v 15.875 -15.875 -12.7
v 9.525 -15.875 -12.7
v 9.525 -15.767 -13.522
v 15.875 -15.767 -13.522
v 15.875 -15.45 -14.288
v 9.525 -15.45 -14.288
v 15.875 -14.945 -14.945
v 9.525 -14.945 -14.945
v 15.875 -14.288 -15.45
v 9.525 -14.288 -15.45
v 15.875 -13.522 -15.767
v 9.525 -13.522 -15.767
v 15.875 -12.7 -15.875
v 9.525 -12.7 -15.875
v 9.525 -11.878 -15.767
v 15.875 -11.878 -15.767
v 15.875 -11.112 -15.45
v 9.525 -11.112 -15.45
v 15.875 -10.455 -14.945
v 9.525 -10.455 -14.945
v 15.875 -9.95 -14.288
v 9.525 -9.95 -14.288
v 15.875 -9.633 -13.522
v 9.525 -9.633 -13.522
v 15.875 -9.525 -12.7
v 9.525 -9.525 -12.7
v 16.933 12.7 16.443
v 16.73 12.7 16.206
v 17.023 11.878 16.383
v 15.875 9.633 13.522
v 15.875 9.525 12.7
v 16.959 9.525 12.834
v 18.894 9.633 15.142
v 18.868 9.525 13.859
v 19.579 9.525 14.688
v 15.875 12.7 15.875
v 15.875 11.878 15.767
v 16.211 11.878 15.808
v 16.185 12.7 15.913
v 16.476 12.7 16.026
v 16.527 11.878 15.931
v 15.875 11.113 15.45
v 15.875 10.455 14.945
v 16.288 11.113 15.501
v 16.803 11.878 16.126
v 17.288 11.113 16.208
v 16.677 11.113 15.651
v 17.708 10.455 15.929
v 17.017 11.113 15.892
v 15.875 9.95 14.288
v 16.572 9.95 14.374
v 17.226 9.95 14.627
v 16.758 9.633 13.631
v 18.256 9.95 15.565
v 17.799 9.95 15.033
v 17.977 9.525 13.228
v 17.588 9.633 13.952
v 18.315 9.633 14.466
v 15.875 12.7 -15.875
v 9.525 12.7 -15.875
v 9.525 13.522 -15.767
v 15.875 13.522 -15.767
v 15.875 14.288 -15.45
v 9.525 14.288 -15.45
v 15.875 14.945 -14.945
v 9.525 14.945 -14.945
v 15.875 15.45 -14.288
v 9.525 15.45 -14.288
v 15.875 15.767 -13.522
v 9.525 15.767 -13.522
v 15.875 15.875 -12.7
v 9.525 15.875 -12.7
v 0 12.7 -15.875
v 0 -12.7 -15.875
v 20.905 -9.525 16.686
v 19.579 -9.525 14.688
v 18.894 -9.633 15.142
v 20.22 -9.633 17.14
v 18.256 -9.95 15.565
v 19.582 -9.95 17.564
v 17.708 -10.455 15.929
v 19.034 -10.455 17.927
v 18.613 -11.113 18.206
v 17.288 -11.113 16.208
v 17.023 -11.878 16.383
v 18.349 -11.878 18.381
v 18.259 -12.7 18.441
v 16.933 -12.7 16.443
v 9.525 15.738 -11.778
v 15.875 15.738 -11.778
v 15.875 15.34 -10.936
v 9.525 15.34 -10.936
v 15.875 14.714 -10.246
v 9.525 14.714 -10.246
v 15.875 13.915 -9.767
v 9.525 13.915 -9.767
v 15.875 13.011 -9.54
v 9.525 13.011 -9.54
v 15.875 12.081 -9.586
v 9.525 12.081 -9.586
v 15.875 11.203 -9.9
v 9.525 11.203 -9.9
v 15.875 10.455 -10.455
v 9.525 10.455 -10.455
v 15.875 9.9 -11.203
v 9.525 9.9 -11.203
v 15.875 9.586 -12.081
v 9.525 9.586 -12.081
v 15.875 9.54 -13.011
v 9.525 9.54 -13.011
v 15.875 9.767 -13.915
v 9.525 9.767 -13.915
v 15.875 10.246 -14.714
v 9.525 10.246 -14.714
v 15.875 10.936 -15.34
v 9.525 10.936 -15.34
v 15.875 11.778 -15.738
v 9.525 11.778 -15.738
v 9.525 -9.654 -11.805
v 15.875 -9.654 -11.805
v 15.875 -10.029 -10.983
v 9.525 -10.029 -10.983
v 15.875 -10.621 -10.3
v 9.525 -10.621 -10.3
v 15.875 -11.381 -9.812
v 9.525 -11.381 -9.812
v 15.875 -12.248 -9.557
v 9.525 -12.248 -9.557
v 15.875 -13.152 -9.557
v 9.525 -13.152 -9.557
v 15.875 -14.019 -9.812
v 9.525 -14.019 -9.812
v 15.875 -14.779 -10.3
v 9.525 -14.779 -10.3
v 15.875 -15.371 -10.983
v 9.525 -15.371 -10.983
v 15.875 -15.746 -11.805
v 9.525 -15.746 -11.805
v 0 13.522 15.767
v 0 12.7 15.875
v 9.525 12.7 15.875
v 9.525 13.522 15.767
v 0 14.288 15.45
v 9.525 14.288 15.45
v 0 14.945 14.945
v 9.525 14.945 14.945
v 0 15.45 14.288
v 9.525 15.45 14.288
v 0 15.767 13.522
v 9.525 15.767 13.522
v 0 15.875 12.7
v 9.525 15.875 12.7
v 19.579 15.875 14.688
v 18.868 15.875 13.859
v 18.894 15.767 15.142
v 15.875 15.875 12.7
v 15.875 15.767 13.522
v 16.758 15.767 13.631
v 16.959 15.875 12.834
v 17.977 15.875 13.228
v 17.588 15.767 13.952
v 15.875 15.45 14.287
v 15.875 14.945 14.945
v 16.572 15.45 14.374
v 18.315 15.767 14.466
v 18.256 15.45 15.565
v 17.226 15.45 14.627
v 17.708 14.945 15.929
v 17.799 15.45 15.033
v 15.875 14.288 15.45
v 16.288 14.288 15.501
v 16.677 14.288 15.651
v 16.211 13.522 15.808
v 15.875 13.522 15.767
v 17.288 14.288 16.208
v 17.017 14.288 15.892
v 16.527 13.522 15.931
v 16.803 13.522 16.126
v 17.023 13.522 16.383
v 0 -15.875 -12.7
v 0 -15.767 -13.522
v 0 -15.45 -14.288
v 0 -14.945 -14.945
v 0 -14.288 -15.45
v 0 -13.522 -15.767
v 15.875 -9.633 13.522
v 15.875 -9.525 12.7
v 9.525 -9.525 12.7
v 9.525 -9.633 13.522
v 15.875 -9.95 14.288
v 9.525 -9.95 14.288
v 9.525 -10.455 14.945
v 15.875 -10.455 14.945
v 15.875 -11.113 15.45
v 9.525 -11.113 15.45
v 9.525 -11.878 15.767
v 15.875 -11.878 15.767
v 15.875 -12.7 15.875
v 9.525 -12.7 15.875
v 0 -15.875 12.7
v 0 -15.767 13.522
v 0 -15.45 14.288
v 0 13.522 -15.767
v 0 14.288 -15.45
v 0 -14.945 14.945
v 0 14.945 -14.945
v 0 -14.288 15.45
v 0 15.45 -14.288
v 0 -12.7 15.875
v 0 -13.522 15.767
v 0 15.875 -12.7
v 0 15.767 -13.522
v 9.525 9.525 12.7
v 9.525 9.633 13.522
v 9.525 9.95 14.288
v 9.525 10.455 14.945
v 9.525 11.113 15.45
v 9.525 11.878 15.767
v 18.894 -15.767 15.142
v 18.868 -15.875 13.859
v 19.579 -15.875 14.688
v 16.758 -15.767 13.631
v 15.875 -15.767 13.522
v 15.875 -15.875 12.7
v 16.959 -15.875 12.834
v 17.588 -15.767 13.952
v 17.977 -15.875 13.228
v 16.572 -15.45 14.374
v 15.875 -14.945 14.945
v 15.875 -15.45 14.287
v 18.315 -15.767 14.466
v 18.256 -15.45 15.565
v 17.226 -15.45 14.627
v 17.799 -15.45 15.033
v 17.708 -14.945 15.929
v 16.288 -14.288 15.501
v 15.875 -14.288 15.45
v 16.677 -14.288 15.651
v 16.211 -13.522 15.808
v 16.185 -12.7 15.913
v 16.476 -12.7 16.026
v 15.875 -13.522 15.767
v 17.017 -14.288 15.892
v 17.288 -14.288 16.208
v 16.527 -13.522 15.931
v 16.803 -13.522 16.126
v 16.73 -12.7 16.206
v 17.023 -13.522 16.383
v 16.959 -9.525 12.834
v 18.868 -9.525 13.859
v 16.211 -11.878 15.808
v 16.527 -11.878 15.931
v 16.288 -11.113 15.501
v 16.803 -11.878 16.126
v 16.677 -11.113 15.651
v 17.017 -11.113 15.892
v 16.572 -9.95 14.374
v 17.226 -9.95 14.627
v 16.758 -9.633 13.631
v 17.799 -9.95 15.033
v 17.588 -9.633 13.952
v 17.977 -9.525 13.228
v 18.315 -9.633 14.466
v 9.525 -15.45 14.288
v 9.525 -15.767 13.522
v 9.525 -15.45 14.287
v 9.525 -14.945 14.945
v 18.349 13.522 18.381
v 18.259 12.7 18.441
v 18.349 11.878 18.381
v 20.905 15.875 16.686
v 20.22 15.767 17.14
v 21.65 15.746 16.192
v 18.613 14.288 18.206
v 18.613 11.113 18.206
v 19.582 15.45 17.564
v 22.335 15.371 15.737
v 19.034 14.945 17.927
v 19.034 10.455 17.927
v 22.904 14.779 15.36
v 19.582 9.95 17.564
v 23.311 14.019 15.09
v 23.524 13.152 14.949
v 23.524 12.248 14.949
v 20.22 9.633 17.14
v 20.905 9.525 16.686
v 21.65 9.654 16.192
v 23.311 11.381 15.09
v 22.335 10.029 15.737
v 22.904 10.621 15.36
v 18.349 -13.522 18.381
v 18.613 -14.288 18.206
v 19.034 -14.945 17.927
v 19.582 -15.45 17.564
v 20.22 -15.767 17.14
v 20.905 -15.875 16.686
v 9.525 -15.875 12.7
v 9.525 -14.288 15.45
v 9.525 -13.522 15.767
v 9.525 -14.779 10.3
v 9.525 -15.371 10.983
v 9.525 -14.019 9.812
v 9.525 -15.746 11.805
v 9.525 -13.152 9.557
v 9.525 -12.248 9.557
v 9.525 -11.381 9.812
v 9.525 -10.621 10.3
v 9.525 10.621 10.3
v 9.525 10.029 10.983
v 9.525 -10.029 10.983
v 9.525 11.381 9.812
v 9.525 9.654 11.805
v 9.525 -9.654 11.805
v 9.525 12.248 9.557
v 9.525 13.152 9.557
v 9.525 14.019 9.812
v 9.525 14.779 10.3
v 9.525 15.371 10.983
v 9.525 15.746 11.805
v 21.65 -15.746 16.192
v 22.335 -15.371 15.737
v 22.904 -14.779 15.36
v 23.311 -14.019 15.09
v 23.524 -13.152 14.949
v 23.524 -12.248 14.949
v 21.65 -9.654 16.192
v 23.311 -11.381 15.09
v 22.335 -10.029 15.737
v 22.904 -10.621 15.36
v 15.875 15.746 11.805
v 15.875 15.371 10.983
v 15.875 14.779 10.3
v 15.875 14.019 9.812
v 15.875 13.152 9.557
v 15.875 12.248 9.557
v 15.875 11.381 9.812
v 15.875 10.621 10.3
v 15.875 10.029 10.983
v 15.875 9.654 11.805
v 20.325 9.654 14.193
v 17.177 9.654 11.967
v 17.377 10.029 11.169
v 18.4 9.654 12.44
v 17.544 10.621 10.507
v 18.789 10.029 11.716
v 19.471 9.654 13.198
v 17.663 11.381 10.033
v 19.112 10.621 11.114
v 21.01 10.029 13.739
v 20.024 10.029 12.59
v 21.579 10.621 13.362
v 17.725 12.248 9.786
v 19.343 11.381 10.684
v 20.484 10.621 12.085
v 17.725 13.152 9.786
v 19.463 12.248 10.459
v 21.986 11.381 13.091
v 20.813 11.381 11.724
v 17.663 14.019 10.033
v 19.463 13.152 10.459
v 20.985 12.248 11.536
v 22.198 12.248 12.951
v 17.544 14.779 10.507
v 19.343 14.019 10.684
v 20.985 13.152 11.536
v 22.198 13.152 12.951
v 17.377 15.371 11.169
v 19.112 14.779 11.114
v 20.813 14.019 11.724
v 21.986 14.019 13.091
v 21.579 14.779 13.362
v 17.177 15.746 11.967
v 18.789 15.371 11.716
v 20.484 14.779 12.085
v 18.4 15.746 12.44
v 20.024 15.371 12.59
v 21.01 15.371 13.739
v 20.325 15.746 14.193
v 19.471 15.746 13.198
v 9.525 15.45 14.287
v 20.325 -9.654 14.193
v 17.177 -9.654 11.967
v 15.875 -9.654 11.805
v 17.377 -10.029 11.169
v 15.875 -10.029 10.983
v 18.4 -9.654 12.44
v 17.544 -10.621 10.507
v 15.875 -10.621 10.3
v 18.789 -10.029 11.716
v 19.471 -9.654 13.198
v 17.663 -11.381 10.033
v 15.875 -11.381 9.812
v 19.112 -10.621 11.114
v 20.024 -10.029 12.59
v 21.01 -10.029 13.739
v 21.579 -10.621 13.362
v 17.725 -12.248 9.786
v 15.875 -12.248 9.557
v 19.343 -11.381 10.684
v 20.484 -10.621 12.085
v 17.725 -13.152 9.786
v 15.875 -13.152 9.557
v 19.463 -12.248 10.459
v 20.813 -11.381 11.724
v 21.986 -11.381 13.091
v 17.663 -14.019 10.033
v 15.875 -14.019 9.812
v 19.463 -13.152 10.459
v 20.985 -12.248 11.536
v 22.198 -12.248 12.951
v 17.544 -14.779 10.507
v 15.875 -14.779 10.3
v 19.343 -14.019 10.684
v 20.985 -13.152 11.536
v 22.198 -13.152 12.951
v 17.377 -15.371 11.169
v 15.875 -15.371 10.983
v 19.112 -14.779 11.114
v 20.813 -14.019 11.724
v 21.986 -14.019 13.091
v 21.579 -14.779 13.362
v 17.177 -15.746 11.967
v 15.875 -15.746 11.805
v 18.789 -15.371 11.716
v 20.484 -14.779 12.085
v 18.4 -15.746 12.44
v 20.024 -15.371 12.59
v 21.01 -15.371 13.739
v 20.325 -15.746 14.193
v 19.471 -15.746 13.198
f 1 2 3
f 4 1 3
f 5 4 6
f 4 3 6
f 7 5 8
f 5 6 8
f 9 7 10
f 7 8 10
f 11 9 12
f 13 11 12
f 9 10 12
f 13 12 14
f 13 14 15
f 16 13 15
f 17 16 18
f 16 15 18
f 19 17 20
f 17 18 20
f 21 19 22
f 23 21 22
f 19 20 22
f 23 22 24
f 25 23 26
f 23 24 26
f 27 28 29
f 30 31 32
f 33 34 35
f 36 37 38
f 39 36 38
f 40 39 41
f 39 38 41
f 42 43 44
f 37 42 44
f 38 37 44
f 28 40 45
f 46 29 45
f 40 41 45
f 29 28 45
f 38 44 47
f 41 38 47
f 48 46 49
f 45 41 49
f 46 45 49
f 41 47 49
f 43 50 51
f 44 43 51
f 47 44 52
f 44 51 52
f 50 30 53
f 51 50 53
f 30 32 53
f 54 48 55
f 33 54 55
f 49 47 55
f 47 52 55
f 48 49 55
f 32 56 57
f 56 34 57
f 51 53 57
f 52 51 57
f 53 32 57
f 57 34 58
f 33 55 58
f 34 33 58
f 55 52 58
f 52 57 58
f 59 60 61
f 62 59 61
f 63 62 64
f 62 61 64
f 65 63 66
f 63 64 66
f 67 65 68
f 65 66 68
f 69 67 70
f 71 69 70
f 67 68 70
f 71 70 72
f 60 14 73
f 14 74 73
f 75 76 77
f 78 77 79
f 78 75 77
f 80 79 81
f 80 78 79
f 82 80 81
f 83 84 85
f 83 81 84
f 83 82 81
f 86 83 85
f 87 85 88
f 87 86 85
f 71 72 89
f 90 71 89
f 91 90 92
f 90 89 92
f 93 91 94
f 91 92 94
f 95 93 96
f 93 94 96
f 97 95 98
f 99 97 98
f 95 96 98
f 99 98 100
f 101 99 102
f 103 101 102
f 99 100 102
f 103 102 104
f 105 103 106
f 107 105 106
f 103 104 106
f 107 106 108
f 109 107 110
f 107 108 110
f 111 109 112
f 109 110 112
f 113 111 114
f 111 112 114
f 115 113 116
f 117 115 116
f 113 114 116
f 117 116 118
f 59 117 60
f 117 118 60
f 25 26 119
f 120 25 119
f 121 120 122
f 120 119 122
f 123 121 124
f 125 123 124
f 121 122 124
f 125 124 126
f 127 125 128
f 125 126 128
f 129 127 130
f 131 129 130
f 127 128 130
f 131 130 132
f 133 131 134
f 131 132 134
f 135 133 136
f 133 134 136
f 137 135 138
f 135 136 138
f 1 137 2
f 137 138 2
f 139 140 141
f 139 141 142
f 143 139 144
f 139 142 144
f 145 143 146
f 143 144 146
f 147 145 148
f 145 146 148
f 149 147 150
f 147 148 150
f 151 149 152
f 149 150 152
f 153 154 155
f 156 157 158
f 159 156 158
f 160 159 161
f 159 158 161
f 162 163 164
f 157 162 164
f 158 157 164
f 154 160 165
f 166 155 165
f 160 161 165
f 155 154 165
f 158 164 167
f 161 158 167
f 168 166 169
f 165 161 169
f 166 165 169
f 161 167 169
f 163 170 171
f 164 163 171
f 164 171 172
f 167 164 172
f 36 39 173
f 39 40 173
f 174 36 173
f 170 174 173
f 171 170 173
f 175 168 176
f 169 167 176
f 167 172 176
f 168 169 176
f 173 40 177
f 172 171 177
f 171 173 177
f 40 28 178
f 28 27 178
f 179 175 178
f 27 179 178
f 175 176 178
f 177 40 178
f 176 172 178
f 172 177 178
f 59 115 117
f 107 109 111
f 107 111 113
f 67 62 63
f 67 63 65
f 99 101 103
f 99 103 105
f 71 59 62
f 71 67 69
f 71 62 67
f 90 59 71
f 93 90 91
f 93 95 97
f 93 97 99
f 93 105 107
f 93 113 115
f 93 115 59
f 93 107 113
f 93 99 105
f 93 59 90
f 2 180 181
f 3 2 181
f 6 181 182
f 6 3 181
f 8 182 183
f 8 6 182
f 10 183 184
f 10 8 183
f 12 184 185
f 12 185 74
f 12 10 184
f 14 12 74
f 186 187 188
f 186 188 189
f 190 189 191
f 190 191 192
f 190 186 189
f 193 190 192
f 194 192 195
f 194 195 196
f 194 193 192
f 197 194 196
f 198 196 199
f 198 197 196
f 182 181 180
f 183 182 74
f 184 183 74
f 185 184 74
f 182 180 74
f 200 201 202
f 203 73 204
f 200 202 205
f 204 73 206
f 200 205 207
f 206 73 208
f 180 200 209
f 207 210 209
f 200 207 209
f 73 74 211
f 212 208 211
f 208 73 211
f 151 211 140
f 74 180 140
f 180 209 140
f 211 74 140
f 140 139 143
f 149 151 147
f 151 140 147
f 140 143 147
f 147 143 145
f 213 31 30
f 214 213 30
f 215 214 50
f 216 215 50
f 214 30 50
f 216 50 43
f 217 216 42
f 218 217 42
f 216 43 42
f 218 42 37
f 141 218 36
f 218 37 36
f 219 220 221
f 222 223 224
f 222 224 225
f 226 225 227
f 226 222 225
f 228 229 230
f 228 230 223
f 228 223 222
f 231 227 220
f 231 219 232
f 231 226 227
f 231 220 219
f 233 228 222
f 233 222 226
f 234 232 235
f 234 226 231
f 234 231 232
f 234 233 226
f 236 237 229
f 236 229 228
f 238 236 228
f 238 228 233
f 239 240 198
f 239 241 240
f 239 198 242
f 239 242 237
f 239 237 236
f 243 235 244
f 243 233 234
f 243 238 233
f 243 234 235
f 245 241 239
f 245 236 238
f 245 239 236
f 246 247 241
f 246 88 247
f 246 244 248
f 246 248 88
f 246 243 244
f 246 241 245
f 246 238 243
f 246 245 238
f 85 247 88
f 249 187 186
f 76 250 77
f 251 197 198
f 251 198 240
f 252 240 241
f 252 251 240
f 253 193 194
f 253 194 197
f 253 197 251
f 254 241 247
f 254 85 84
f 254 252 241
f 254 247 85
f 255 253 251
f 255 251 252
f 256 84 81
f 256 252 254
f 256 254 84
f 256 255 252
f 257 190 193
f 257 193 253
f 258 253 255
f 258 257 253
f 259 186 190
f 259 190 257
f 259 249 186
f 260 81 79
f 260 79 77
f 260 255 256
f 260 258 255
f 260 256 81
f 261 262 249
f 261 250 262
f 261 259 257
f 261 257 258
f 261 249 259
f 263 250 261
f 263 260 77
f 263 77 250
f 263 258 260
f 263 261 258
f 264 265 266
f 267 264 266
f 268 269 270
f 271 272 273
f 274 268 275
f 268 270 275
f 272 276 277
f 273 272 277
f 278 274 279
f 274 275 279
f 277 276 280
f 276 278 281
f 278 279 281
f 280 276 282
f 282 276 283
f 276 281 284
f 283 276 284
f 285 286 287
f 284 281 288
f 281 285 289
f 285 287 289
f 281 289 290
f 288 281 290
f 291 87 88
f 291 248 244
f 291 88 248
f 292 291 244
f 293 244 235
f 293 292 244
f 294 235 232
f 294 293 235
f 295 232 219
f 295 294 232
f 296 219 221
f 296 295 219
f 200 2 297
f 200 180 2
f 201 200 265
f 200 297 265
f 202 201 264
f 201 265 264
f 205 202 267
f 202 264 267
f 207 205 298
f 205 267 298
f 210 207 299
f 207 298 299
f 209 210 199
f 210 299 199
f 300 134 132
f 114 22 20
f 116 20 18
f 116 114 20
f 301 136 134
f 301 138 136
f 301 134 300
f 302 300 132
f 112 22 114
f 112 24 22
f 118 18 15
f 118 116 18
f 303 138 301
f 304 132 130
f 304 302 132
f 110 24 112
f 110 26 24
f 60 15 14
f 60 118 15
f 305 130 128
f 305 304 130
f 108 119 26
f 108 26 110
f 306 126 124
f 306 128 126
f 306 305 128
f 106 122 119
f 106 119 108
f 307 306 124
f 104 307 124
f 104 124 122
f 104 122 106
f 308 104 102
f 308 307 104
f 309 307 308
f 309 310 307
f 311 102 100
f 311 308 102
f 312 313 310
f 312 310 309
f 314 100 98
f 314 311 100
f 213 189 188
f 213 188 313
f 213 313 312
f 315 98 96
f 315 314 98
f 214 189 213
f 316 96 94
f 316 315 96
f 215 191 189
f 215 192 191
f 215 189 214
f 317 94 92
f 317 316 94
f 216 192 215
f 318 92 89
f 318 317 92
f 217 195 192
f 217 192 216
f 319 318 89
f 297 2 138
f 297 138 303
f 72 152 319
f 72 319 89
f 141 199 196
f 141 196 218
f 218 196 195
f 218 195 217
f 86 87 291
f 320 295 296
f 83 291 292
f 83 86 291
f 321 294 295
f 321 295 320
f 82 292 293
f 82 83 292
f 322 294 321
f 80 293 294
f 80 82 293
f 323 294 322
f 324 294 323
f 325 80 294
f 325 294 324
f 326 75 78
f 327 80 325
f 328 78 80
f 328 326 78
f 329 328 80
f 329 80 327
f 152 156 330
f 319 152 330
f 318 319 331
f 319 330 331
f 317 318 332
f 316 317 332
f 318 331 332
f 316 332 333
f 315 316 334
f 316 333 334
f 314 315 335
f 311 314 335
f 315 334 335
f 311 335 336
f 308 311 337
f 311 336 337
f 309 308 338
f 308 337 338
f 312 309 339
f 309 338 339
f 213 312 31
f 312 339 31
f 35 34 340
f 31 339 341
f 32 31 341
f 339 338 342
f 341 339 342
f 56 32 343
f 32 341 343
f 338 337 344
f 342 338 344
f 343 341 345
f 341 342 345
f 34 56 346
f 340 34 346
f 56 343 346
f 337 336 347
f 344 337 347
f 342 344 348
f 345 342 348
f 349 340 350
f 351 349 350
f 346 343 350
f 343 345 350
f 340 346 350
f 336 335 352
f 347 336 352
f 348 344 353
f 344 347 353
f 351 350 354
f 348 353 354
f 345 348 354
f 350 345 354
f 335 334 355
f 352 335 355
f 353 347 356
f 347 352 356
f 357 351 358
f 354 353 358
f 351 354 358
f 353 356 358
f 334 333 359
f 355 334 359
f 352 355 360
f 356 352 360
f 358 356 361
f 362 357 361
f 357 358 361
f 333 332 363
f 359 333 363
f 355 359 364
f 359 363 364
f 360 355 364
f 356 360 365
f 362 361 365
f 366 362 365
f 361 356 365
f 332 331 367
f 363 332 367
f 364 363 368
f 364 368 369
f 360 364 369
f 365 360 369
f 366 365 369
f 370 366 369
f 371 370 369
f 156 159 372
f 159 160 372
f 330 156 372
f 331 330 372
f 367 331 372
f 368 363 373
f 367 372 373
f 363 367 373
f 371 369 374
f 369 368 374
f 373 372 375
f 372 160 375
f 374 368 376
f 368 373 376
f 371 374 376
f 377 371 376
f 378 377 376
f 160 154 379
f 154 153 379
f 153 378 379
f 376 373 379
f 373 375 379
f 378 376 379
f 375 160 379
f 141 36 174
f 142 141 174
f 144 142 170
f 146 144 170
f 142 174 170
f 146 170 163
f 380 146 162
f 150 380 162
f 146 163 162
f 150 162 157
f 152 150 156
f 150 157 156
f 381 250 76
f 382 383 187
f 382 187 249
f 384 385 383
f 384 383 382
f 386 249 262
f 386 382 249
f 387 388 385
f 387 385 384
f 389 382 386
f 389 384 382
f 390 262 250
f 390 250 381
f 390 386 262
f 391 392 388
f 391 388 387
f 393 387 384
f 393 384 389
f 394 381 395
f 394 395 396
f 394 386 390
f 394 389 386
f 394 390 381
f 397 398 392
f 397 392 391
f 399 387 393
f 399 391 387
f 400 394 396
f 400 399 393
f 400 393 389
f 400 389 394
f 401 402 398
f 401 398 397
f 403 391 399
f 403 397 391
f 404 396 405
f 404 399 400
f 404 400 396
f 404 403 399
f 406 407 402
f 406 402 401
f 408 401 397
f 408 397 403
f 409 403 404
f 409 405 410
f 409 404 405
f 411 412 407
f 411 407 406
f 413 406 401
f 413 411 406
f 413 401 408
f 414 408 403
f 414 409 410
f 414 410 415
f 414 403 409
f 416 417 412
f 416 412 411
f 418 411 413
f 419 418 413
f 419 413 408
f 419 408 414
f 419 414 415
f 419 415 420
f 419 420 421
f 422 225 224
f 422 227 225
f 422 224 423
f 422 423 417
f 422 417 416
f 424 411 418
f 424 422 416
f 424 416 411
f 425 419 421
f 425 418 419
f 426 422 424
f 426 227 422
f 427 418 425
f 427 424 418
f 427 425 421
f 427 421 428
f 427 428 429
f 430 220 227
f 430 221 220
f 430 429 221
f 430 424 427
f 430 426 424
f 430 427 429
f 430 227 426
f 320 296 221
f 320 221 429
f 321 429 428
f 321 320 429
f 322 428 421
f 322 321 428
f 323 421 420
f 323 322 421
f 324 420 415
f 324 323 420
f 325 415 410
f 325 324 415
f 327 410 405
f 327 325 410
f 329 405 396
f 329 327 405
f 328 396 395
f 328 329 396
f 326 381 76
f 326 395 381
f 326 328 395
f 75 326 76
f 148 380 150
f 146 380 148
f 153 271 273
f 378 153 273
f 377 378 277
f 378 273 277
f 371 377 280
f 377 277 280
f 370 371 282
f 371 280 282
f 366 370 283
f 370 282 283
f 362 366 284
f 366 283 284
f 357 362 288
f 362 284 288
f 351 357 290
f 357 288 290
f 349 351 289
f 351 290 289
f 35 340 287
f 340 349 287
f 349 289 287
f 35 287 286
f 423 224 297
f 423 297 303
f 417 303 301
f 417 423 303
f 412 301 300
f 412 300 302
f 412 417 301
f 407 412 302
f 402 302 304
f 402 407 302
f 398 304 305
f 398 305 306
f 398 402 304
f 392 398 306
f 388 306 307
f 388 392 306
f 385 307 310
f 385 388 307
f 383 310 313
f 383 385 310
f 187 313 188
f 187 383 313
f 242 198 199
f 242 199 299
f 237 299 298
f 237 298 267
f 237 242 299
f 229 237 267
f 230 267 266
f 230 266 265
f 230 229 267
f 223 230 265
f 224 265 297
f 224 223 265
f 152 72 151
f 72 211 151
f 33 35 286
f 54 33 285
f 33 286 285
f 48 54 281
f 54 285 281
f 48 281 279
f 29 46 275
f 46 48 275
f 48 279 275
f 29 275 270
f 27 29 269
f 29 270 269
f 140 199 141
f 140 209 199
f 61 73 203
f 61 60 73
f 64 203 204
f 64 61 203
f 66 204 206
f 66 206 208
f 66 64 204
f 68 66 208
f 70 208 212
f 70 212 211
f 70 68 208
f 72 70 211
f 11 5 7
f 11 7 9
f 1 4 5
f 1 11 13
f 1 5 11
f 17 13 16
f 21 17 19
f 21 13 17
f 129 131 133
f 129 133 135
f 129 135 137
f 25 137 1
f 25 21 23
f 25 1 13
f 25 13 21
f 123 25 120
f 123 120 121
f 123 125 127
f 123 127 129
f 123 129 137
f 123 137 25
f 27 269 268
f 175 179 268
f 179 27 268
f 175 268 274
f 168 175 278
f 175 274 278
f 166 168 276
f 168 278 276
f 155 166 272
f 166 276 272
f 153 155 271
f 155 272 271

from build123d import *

# Parameters (mm, degrees)
F0_W      = 31.75
F0_H      = 31.75
F1_DEPTH  = 9.525
F10_DEPTH = 6.35
F11_R     = 3.1749


# Not quite as in the source:
# - a fillet or chamfer is up to 0.001 mm smaller than in the source, because OpenCascade refuses the exact size


with BuildPart() as f1:
    # F0 (on Right) → F1 (new body)
    with BuildSketch(Plane.YZ):
        Rectangle(F0_W, F0_H)
    extrude(amount=F1_DEPTH)

    # F6: sweep along a path in F5
    with BuildLine(Plane.XZ.offset(12.7)) as f6_path:
        Line((9.525, 9.525), (15.875, 9.525))
        ThreePointArc((15.875, 9.525), (19.4783384003, 10.4308096264), (22.225, 12.9328865162))
        Line((22.225, 12.9328865162), (23.5505334947, 14.9312034475))
    # F2 (on face) → F6 (sweep)
    with BuildSketch(Plane.YZ.offset(9.525)):
        with BuildLine():
            ThreePointArc((-15.875, 12.7), (-12.7, 9.525), (-9.525, 12.7))
            ThreePointArc((-9.525, 12.7), (-10.4549359718, 14.9450640323), (-12.7000000057, 15.875))
            ThreePointArc((-12.7000000057, 15.875), (-14.9450640323, 14.9450640282), (-15.875, 12.7))
        make_face()
    sweep(path=f6_path.line)

    # F9: F1 across plane


with BuildPart() as f1_1:
    add(f1.part)
    add(f1.part.mirror(Plane(origin=(0, 0, 15.875), x_dir=(1, 0, 0), z_dir=(0, -1, 0))))

    # F2 (on face) → F10 (join)
    with BuildSketch(Plane.YZ.offset(9.525)):
        with BuildLine():
            ThreePointArc((-9.525, -12.7), (-12.7, -9.525), (-15.875, -12.7))
            ThreePointArc((-15.875, -12.7), (-14.9450640303, -14.9450640303), (-12.7, -15.875))
            ThreePointArc((-12.7, -15.875), (-10.4549359697, -14.9450640303), (-9.525, -12.7))
        make_face()
        with BuildLine():
            ThreePointArc((12.7, -15.875), (14.9450640303, -14.9450640303), (15.875, -12.7))
            ThreePointArc((15.875, -12.7), (10.4549359697, -10.4549359697), (12.7, -15.875))
        make_face()
    extrude(amount=F10_DEPTH)

    # F11 (radius 3.175 in the source; OpenCascade refuses exactly that, so slightly less here)
    f11_edges = [f1_1.edges().sort_by_distance(p)[0] for p in [
        (4.7625, -15.875, 15.875),
        (4.7625, -15.875, -15.875),
        (4.7625, 15.875, -15.875),
        (4.7625, 15.875, 15.875),
    ]]
    fillet(f11_edges, radius=F11_R)


solid = f1_1.part
